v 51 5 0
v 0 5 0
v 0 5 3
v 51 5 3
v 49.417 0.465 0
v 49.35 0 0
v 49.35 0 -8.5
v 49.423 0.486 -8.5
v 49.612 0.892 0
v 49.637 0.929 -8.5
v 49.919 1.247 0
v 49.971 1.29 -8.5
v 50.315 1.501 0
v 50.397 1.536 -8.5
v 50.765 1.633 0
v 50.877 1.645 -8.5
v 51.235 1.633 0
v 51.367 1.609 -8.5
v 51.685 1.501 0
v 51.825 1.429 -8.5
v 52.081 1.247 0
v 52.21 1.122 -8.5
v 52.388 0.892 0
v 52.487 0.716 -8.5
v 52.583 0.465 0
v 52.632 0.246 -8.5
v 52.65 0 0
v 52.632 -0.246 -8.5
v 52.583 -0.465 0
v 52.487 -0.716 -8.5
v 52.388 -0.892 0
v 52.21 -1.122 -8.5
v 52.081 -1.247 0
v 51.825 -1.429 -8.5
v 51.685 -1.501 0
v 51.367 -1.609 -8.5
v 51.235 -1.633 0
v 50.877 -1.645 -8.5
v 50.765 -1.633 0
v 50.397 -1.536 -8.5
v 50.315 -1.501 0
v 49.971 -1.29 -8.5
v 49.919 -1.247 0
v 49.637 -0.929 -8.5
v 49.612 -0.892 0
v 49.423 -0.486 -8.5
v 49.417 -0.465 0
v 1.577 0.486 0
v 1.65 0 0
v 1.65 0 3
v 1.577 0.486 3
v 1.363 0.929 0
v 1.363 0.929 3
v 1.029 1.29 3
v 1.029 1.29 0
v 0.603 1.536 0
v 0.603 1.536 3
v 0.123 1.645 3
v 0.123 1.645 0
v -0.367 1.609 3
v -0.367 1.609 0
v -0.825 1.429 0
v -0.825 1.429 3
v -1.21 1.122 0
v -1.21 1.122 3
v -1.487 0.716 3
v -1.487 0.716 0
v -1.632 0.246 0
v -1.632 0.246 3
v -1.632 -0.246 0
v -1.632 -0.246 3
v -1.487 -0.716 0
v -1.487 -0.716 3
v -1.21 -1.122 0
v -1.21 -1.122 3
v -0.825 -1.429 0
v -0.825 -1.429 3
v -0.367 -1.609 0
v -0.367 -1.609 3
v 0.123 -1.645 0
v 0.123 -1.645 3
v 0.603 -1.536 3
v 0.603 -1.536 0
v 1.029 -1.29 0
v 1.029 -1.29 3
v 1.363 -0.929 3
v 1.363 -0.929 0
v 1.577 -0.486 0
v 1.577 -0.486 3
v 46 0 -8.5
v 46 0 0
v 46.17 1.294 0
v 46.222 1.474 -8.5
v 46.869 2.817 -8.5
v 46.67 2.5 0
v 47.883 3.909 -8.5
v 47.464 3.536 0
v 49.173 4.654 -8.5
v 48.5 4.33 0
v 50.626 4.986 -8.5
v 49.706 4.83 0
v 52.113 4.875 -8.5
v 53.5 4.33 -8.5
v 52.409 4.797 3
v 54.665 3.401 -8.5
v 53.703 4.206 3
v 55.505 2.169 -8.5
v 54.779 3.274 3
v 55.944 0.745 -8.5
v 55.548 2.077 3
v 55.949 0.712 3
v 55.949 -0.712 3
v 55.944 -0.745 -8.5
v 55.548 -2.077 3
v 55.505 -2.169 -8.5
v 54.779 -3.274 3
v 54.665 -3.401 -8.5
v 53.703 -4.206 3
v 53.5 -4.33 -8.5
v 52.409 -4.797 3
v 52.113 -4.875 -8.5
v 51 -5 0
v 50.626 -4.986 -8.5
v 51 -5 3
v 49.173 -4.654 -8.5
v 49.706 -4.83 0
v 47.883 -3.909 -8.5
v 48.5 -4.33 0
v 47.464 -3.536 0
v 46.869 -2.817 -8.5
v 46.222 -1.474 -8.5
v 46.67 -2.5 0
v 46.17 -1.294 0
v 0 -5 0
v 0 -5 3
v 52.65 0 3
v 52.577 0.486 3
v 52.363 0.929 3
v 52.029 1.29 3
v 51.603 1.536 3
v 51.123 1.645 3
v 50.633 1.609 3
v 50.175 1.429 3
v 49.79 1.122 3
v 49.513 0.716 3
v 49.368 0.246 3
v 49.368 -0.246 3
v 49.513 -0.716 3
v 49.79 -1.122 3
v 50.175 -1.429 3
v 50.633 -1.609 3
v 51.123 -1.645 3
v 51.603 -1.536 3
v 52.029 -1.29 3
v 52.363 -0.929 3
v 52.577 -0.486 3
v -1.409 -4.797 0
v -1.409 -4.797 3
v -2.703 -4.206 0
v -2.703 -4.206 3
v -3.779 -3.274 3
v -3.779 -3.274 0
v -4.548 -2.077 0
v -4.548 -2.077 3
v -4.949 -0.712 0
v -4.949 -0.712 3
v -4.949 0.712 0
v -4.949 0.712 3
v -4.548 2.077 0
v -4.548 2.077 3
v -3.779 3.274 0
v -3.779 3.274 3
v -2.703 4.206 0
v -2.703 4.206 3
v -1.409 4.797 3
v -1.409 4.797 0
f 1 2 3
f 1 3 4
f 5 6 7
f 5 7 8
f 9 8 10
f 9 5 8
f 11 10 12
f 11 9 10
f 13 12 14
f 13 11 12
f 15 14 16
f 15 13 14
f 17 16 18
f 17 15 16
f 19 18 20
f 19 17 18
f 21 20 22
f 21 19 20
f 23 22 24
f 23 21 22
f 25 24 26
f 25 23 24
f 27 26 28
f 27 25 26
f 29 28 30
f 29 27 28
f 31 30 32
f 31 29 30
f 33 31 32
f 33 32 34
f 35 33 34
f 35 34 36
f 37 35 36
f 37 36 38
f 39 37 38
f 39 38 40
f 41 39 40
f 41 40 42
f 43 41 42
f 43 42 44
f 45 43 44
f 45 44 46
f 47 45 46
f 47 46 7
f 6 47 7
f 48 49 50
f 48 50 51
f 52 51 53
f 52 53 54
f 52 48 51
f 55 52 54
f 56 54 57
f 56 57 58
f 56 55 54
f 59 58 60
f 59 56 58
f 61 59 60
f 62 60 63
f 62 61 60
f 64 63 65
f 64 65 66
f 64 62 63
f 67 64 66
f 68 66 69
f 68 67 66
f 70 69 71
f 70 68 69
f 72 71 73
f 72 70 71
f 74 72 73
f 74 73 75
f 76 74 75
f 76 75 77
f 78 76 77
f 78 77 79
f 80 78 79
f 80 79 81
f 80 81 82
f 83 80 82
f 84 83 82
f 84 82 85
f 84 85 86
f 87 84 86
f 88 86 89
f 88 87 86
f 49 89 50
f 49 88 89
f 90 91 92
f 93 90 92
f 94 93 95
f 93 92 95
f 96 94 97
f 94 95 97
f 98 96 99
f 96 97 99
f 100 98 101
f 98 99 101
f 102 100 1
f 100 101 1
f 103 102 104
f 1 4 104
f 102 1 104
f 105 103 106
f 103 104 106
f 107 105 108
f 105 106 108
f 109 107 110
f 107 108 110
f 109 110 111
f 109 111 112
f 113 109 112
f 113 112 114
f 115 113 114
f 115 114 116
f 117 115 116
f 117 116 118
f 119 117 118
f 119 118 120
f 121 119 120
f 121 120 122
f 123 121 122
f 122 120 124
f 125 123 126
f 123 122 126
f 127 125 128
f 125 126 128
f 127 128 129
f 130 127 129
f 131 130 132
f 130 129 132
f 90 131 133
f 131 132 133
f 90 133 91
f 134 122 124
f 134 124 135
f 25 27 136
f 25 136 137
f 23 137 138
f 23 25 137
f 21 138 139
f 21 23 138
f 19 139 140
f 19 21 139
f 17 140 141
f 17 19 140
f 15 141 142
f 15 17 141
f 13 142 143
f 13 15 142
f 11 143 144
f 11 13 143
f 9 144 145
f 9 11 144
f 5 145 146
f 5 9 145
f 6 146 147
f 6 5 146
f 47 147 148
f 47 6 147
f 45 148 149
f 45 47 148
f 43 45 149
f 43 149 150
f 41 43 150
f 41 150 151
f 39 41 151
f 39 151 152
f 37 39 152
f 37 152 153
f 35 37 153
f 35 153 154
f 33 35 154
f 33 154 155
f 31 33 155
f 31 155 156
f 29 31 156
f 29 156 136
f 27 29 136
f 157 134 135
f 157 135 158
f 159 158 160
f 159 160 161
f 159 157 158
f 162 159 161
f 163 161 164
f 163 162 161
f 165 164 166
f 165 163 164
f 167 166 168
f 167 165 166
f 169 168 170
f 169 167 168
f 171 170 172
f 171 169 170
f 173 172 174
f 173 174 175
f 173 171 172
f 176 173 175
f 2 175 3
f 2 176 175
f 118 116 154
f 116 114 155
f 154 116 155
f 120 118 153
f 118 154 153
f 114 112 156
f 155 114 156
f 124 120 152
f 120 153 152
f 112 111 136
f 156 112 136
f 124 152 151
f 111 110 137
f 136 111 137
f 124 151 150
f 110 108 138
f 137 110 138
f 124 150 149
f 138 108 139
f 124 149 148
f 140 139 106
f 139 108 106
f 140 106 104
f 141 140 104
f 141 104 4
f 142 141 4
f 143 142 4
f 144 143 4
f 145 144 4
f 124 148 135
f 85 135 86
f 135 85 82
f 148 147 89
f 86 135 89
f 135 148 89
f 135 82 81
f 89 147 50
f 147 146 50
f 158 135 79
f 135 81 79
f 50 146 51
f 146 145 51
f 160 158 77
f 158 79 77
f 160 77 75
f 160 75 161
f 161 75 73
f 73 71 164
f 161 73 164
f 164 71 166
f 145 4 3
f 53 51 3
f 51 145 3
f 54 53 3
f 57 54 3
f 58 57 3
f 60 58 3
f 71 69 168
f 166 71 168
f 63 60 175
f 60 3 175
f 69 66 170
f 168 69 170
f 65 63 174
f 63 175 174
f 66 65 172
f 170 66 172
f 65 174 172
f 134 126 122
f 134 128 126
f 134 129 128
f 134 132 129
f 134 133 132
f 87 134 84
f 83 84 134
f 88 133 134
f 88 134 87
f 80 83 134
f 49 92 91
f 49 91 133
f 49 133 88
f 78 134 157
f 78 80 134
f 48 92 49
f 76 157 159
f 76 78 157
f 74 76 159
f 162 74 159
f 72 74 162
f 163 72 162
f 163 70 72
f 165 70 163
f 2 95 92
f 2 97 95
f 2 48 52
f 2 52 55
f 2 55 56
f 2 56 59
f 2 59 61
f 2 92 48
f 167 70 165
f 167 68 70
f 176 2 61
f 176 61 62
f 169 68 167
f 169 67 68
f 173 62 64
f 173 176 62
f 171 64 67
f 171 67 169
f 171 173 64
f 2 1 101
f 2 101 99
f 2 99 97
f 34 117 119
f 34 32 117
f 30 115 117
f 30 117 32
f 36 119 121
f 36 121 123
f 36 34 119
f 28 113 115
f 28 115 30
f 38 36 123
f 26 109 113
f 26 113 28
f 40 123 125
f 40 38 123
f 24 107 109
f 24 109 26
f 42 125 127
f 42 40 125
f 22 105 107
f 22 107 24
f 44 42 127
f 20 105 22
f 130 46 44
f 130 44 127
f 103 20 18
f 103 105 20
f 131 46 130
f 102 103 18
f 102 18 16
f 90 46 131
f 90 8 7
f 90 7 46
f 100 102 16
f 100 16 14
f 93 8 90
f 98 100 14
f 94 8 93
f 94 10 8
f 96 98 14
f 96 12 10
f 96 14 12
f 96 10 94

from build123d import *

# Parameters (mm, degrees)
SKETCH_1_R      = 1.65
EXTRUDE_1_DEPTH = 3
SKETCH_2_R      = 5
SKETCH_2_R_2    = 1.65
EXTRUDE_2_DEPTH = 8.5


with BuildPart() as part:
    # 草圖1 → 填料-伸長1 (new body)
    with BuildSketch(Plane.XY):
        with BuildLine():
            Line((0, 5), (51, 5))
            ThreePointArc((51, 5), (56, 0), (51, -5))
            Line((51, -5), (0, -5))
            ThreePointArc((0, -5), (-5, 0), (0, 5))
        make_face()
        Circle(SKETCH_1_R, mode=Mode.SUBTRACT)
        with Locations((51, 0)):
            Circle(SKETCH_1_R, mode=Mode.SUBTRACT)
    extrude(amount=EXTRUDE_1_DEPTH)

    # 草圖2 → 填料-伸長2 (add)
    with BuildSketch(Plane(origin=(0, 0, 0), x_dir=(-1, 0, 0), z_dir=(0, 0, -1))):
        with Locations((-51, 0)):
            Circle(SKETCH_2_R)
        with Locations((-51, 0)):
            Circle(SKETCH_2_R_2, mode=Mode.SUBTRACT)
    extrude(amount=EXTRUDE_2_DEPTH)


solid = part.part
